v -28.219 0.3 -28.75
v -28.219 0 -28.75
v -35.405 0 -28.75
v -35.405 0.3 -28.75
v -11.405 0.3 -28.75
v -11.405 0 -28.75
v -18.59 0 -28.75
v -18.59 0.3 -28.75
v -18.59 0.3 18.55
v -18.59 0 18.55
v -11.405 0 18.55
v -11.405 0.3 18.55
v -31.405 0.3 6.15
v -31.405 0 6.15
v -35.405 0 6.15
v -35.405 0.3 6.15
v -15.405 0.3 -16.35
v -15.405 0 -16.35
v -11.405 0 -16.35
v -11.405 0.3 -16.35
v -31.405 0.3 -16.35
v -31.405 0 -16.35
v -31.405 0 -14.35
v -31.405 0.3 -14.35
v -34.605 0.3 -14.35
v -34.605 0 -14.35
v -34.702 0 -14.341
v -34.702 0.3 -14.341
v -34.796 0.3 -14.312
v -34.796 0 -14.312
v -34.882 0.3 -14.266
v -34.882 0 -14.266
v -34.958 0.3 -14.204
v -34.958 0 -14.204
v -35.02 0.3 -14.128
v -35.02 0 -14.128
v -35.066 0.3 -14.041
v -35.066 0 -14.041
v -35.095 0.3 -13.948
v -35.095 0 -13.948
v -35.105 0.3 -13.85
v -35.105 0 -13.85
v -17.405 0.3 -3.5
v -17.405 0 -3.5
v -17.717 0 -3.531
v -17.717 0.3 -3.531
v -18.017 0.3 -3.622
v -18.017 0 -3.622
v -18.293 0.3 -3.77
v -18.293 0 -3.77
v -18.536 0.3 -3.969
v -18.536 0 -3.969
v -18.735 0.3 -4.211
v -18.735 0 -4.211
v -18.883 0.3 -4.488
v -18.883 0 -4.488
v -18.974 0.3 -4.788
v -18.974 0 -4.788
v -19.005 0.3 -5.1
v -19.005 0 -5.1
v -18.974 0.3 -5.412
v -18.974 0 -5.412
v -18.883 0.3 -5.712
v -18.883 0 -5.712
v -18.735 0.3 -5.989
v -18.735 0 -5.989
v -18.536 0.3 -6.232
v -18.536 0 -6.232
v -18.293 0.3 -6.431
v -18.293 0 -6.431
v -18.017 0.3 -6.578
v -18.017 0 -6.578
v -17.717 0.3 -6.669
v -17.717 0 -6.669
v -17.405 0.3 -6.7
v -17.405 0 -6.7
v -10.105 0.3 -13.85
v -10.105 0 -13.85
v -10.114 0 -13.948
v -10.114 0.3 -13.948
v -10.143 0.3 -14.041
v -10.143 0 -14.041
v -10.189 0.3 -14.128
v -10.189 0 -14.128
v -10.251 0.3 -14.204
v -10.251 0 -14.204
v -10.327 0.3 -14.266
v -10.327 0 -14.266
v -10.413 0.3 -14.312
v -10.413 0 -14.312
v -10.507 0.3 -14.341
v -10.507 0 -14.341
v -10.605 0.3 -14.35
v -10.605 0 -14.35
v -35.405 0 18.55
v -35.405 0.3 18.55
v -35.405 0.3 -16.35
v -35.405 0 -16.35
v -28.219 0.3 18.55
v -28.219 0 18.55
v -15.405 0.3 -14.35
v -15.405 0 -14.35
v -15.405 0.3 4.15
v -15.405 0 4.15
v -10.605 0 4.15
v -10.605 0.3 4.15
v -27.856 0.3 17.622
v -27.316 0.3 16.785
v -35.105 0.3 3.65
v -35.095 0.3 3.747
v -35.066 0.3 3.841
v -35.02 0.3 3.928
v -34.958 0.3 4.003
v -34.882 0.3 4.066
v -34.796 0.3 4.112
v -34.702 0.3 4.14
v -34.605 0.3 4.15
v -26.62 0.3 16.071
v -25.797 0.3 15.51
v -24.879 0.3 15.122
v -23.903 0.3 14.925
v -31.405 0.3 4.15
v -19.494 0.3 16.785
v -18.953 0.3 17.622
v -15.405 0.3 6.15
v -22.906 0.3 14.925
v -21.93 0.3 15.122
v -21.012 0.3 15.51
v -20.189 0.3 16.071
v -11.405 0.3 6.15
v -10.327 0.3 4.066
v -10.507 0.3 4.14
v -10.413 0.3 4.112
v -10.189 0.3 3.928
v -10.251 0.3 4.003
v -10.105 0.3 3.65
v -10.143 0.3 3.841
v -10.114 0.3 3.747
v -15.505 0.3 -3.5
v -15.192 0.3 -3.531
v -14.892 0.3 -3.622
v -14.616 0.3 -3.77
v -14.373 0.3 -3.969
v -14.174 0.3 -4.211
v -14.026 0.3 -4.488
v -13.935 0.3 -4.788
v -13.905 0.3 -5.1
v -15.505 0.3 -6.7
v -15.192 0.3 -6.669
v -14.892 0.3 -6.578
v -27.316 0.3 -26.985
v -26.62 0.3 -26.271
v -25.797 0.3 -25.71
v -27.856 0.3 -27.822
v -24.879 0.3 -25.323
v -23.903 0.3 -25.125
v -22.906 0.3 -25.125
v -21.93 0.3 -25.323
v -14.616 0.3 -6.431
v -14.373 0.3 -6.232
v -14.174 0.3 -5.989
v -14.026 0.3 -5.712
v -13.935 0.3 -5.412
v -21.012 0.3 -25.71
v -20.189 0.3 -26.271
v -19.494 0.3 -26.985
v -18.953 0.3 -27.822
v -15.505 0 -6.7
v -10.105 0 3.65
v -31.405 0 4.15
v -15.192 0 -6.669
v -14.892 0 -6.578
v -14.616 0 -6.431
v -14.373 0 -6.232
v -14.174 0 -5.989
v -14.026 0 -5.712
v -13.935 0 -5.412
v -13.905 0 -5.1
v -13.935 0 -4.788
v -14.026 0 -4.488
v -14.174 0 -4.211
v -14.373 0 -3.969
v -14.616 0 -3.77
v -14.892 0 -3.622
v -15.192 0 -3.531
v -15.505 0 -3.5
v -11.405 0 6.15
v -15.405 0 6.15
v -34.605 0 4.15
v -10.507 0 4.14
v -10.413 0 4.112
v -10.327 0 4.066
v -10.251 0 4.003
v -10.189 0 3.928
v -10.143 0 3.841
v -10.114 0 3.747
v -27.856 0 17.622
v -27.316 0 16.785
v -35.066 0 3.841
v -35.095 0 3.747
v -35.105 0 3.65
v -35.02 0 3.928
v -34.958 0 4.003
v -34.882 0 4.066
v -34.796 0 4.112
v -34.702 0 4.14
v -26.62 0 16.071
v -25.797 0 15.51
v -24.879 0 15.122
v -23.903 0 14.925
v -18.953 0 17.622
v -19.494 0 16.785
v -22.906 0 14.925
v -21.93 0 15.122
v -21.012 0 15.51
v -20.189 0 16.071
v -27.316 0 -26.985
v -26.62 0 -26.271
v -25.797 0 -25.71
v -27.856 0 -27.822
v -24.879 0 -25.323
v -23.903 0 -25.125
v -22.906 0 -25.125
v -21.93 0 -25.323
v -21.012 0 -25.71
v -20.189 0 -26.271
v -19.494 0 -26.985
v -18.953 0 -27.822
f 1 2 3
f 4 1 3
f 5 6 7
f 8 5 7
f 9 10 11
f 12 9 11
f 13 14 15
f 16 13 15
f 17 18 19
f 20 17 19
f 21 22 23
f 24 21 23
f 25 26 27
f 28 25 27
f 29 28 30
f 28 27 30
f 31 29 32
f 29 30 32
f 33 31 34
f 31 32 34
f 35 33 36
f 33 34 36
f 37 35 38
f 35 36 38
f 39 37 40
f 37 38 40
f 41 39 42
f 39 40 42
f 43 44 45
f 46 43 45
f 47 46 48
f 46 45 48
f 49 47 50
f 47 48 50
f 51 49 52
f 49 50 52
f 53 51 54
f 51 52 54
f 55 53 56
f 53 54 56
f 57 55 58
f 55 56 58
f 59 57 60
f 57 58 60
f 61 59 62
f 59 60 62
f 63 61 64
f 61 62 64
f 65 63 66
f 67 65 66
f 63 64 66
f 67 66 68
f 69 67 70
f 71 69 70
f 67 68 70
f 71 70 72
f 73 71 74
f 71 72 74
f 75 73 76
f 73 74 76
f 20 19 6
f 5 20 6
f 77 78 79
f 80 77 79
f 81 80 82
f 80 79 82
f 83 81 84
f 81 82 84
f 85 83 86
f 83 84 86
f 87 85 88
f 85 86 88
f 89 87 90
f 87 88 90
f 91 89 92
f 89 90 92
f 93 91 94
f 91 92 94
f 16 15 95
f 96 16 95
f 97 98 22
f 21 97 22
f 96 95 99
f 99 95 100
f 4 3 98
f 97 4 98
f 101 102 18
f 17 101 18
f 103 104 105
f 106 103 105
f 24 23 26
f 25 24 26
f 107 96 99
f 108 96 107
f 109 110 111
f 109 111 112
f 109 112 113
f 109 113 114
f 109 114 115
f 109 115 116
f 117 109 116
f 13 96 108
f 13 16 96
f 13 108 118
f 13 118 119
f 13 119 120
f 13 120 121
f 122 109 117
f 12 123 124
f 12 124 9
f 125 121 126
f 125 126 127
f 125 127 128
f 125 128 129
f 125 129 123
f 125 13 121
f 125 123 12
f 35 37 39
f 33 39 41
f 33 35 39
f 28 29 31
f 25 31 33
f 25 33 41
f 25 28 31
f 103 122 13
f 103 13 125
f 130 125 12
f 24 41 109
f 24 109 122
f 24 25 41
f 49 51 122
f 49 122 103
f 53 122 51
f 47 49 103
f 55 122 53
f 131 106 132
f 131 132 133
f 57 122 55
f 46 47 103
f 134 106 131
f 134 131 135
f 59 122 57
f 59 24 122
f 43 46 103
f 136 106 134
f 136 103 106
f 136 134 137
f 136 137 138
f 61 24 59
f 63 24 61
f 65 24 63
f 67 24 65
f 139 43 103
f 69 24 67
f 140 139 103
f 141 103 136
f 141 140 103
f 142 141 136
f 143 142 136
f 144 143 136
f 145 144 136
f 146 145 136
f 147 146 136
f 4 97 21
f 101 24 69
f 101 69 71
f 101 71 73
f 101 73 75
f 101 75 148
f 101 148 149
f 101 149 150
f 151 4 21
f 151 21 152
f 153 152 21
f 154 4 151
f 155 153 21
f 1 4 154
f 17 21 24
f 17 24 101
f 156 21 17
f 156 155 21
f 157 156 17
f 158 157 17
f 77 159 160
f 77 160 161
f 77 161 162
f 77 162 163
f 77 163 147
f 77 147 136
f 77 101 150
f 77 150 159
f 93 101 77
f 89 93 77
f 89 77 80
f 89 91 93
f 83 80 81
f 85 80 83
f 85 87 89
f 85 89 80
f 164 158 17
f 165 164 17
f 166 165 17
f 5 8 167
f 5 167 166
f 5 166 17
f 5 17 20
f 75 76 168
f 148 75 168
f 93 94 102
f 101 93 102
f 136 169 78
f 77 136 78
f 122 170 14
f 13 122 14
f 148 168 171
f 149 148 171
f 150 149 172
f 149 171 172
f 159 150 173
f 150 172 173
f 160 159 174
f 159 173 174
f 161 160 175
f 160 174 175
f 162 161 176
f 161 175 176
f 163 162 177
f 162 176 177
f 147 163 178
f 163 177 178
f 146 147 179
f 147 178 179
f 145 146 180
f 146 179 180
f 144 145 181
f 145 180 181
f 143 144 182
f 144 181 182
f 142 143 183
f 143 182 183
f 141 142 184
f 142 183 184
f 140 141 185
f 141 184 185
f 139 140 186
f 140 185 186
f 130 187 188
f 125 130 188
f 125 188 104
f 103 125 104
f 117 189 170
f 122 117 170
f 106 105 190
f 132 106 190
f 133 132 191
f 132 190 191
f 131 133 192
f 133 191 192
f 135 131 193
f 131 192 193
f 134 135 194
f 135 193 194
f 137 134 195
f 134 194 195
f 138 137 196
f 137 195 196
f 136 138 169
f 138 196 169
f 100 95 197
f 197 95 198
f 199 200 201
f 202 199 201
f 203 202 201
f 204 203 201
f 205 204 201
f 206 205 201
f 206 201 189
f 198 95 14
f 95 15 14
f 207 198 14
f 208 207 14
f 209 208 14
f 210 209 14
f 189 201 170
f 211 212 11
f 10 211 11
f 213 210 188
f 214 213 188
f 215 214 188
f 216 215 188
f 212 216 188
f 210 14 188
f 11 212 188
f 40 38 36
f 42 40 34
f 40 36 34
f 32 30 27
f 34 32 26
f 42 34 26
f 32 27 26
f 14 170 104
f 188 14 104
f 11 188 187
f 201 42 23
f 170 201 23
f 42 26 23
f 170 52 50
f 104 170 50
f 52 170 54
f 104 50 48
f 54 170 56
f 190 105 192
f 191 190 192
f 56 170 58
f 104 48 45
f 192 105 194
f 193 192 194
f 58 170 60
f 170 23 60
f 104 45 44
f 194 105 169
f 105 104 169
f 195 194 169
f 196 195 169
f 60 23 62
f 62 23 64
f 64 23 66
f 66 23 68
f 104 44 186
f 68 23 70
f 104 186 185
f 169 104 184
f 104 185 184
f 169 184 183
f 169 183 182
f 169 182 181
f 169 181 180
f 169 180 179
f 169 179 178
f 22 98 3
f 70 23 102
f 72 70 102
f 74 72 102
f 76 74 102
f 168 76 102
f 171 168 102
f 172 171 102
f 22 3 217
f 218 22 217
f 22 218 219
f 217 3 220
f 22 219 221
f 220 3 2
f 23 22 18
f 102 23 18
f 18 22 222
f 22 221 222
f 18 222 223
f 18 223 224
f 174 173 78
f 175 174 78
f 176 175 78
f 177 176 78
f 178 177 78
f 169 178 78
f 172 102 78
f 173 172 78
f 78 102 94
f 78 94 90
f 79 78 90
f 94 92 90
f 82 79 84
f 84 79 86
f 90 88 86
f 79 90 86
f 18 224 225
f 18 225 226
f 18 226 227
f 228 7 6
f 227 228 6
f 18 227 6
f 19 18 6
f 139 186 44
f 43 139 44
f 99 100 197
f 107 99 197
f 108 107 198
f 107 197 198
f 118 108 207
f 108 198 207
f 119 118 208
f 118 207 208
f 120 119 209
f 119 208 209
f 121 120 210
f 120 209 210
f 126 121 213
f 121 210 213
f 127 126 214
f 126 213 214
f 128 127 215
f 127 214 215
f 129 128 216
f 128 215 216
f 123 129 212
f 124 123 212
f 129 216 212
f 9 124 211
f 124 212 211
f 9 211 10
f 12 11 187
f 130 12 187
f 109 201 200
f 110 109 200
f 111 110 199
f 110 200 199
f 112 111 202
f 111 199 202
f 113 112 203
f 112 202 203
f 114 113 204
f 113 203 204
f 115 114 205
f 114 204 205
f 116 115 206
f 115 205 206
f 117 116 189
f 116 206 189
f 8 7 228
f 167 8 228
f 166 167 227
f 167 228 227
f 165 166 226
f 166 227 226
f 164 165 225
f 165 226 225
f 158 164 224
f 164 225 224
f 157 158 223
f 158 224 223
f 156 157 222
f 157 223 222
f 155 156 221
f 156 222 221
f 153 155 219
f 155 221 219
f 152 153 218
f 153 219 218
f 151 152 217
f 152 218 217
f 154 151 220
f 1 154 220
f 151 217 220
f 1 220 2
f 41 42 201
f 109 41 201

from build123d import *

# Parameters (mm, degrees)
EXTRUDE_1_DEPTH = 0.3


with BuildPart() as part:
    # Эскиз1 → Бобышка-Вытянуть1 (new body)
    with BuildSketch(Plane(origin=(0, 0, 0), x_dir=(1, 0, 0), z_dir=(0, 1, 0))):
        with BuildLine():
            Line((-11.404541059, 16.350155755), (-11.404541059, 28.750155755))
            Line((-11.404541059, 28.750155755), (-18.590239448, 28.750155755))
            ThreePointArc((-18.590239448, 28.750155755), (-23.404541059, 25.100155755), (-28.218842669, 28.750155755))
            Line((-28.218842669, 28.750155755), (-35.404541059, 28.750155755))
            Line((-35.404541059, 28.750155755), (-35.404541059, 16.350155755))
            Line((-35.404541059, 16.350155755), (-31.404541059, 16.350155755))
            Line((-31.404541059, 16.350155755), (-31.404541059, 14.350155755))
            Line((-31.404541059, 14.350155755), (-34.604541059, 14.350155755))
            ThreePointArc((-34.604541059, 14.350155755), (-34.958094449, 14.203709145), (-35.104541059, 13.850155755))
            Line((-35.104541059, 13.850155755), (-35.104541059, -3.649844245))
            ThreePointArc((-35.104541059, -3.649844245), (-34.958094449, -4.003397636), (-34.604541059, -4.149844245))
            Line((-34.604541059, -4.149844245), (-31.404541059, -4.149844245))
            Line((-31.404541059, -4.149844245), (-31.404541059, -6.149844245))
            Line((-31.404541059, -6.149844245), (-35.404541059, -6.149844245))
            Line((-35.404541059, -6.149844245), (-35.404541059, -18.549844245))
            Line((-35.404541059, -18.549844245), (-28.218842669, -18.549844245))
            ThreePointArc((-28.218842669, -18.549844245), (-23.404541059, -14.899844245), (-18.590239448, -18.549844245))
            Line((-18.590239448, -18.549844245), (-11.404541059, -18.549844245))
            Line((-11.404541059, -18.549844245), (-11.404541059, -6.149844245))
            Line((-11.404541059, -6.149844245), (-15.404541059, -6.149844245))
            Line((-15.404541059, -6.149844245), (-15.404541059, -4.149844245))
            Line((-15.404541059, -4.149844245), (-10.604541059, -4.149844245))
            ThreePointArc((-10.604541059, -4.149844245), (-10.250987668, -4.003397636), (-10.104541059, -3.649844245))
            Line((-10.104541059, -3.649844245), (-10.104541059, 13.850155755))
            ThreePointArc((-10.104541059, 13.850155755), (-10.250987668, 14.203709145), (-10.604541059, 14.350155755))
            Line((-10.604541059, 14.350155755), (-15.404541059, 14.350155755))
            Line((-15.404541059, 14.350155755), (-15.404541059, 16.350155755))
            Line((-15.404541059, 16.350155755), (-11.404541059, 16.350155755))
        make_face()
        with BuildLine():
            Line((-17.404541059, 6.700155755), (-15.504541059, 6.700155755))
            ThreePointArc((-15.504541059, 6.700155755), (-13.904541059, 5.100155755), (-15.504541059, 3.500155755))
            Line((-15.504541059, 3.500155755), (-17.404541059, 3.500155755))
            ThreePointArc((-17.404541059, 3.500155755), (-19.004541059, 5.100155755), (-17.404541059, 6.700155755))
        make_face(mode=Mode.SUBTRACT)
    extrude(amount=EXTRUDE_1_DEPTH)


solid = part.part
